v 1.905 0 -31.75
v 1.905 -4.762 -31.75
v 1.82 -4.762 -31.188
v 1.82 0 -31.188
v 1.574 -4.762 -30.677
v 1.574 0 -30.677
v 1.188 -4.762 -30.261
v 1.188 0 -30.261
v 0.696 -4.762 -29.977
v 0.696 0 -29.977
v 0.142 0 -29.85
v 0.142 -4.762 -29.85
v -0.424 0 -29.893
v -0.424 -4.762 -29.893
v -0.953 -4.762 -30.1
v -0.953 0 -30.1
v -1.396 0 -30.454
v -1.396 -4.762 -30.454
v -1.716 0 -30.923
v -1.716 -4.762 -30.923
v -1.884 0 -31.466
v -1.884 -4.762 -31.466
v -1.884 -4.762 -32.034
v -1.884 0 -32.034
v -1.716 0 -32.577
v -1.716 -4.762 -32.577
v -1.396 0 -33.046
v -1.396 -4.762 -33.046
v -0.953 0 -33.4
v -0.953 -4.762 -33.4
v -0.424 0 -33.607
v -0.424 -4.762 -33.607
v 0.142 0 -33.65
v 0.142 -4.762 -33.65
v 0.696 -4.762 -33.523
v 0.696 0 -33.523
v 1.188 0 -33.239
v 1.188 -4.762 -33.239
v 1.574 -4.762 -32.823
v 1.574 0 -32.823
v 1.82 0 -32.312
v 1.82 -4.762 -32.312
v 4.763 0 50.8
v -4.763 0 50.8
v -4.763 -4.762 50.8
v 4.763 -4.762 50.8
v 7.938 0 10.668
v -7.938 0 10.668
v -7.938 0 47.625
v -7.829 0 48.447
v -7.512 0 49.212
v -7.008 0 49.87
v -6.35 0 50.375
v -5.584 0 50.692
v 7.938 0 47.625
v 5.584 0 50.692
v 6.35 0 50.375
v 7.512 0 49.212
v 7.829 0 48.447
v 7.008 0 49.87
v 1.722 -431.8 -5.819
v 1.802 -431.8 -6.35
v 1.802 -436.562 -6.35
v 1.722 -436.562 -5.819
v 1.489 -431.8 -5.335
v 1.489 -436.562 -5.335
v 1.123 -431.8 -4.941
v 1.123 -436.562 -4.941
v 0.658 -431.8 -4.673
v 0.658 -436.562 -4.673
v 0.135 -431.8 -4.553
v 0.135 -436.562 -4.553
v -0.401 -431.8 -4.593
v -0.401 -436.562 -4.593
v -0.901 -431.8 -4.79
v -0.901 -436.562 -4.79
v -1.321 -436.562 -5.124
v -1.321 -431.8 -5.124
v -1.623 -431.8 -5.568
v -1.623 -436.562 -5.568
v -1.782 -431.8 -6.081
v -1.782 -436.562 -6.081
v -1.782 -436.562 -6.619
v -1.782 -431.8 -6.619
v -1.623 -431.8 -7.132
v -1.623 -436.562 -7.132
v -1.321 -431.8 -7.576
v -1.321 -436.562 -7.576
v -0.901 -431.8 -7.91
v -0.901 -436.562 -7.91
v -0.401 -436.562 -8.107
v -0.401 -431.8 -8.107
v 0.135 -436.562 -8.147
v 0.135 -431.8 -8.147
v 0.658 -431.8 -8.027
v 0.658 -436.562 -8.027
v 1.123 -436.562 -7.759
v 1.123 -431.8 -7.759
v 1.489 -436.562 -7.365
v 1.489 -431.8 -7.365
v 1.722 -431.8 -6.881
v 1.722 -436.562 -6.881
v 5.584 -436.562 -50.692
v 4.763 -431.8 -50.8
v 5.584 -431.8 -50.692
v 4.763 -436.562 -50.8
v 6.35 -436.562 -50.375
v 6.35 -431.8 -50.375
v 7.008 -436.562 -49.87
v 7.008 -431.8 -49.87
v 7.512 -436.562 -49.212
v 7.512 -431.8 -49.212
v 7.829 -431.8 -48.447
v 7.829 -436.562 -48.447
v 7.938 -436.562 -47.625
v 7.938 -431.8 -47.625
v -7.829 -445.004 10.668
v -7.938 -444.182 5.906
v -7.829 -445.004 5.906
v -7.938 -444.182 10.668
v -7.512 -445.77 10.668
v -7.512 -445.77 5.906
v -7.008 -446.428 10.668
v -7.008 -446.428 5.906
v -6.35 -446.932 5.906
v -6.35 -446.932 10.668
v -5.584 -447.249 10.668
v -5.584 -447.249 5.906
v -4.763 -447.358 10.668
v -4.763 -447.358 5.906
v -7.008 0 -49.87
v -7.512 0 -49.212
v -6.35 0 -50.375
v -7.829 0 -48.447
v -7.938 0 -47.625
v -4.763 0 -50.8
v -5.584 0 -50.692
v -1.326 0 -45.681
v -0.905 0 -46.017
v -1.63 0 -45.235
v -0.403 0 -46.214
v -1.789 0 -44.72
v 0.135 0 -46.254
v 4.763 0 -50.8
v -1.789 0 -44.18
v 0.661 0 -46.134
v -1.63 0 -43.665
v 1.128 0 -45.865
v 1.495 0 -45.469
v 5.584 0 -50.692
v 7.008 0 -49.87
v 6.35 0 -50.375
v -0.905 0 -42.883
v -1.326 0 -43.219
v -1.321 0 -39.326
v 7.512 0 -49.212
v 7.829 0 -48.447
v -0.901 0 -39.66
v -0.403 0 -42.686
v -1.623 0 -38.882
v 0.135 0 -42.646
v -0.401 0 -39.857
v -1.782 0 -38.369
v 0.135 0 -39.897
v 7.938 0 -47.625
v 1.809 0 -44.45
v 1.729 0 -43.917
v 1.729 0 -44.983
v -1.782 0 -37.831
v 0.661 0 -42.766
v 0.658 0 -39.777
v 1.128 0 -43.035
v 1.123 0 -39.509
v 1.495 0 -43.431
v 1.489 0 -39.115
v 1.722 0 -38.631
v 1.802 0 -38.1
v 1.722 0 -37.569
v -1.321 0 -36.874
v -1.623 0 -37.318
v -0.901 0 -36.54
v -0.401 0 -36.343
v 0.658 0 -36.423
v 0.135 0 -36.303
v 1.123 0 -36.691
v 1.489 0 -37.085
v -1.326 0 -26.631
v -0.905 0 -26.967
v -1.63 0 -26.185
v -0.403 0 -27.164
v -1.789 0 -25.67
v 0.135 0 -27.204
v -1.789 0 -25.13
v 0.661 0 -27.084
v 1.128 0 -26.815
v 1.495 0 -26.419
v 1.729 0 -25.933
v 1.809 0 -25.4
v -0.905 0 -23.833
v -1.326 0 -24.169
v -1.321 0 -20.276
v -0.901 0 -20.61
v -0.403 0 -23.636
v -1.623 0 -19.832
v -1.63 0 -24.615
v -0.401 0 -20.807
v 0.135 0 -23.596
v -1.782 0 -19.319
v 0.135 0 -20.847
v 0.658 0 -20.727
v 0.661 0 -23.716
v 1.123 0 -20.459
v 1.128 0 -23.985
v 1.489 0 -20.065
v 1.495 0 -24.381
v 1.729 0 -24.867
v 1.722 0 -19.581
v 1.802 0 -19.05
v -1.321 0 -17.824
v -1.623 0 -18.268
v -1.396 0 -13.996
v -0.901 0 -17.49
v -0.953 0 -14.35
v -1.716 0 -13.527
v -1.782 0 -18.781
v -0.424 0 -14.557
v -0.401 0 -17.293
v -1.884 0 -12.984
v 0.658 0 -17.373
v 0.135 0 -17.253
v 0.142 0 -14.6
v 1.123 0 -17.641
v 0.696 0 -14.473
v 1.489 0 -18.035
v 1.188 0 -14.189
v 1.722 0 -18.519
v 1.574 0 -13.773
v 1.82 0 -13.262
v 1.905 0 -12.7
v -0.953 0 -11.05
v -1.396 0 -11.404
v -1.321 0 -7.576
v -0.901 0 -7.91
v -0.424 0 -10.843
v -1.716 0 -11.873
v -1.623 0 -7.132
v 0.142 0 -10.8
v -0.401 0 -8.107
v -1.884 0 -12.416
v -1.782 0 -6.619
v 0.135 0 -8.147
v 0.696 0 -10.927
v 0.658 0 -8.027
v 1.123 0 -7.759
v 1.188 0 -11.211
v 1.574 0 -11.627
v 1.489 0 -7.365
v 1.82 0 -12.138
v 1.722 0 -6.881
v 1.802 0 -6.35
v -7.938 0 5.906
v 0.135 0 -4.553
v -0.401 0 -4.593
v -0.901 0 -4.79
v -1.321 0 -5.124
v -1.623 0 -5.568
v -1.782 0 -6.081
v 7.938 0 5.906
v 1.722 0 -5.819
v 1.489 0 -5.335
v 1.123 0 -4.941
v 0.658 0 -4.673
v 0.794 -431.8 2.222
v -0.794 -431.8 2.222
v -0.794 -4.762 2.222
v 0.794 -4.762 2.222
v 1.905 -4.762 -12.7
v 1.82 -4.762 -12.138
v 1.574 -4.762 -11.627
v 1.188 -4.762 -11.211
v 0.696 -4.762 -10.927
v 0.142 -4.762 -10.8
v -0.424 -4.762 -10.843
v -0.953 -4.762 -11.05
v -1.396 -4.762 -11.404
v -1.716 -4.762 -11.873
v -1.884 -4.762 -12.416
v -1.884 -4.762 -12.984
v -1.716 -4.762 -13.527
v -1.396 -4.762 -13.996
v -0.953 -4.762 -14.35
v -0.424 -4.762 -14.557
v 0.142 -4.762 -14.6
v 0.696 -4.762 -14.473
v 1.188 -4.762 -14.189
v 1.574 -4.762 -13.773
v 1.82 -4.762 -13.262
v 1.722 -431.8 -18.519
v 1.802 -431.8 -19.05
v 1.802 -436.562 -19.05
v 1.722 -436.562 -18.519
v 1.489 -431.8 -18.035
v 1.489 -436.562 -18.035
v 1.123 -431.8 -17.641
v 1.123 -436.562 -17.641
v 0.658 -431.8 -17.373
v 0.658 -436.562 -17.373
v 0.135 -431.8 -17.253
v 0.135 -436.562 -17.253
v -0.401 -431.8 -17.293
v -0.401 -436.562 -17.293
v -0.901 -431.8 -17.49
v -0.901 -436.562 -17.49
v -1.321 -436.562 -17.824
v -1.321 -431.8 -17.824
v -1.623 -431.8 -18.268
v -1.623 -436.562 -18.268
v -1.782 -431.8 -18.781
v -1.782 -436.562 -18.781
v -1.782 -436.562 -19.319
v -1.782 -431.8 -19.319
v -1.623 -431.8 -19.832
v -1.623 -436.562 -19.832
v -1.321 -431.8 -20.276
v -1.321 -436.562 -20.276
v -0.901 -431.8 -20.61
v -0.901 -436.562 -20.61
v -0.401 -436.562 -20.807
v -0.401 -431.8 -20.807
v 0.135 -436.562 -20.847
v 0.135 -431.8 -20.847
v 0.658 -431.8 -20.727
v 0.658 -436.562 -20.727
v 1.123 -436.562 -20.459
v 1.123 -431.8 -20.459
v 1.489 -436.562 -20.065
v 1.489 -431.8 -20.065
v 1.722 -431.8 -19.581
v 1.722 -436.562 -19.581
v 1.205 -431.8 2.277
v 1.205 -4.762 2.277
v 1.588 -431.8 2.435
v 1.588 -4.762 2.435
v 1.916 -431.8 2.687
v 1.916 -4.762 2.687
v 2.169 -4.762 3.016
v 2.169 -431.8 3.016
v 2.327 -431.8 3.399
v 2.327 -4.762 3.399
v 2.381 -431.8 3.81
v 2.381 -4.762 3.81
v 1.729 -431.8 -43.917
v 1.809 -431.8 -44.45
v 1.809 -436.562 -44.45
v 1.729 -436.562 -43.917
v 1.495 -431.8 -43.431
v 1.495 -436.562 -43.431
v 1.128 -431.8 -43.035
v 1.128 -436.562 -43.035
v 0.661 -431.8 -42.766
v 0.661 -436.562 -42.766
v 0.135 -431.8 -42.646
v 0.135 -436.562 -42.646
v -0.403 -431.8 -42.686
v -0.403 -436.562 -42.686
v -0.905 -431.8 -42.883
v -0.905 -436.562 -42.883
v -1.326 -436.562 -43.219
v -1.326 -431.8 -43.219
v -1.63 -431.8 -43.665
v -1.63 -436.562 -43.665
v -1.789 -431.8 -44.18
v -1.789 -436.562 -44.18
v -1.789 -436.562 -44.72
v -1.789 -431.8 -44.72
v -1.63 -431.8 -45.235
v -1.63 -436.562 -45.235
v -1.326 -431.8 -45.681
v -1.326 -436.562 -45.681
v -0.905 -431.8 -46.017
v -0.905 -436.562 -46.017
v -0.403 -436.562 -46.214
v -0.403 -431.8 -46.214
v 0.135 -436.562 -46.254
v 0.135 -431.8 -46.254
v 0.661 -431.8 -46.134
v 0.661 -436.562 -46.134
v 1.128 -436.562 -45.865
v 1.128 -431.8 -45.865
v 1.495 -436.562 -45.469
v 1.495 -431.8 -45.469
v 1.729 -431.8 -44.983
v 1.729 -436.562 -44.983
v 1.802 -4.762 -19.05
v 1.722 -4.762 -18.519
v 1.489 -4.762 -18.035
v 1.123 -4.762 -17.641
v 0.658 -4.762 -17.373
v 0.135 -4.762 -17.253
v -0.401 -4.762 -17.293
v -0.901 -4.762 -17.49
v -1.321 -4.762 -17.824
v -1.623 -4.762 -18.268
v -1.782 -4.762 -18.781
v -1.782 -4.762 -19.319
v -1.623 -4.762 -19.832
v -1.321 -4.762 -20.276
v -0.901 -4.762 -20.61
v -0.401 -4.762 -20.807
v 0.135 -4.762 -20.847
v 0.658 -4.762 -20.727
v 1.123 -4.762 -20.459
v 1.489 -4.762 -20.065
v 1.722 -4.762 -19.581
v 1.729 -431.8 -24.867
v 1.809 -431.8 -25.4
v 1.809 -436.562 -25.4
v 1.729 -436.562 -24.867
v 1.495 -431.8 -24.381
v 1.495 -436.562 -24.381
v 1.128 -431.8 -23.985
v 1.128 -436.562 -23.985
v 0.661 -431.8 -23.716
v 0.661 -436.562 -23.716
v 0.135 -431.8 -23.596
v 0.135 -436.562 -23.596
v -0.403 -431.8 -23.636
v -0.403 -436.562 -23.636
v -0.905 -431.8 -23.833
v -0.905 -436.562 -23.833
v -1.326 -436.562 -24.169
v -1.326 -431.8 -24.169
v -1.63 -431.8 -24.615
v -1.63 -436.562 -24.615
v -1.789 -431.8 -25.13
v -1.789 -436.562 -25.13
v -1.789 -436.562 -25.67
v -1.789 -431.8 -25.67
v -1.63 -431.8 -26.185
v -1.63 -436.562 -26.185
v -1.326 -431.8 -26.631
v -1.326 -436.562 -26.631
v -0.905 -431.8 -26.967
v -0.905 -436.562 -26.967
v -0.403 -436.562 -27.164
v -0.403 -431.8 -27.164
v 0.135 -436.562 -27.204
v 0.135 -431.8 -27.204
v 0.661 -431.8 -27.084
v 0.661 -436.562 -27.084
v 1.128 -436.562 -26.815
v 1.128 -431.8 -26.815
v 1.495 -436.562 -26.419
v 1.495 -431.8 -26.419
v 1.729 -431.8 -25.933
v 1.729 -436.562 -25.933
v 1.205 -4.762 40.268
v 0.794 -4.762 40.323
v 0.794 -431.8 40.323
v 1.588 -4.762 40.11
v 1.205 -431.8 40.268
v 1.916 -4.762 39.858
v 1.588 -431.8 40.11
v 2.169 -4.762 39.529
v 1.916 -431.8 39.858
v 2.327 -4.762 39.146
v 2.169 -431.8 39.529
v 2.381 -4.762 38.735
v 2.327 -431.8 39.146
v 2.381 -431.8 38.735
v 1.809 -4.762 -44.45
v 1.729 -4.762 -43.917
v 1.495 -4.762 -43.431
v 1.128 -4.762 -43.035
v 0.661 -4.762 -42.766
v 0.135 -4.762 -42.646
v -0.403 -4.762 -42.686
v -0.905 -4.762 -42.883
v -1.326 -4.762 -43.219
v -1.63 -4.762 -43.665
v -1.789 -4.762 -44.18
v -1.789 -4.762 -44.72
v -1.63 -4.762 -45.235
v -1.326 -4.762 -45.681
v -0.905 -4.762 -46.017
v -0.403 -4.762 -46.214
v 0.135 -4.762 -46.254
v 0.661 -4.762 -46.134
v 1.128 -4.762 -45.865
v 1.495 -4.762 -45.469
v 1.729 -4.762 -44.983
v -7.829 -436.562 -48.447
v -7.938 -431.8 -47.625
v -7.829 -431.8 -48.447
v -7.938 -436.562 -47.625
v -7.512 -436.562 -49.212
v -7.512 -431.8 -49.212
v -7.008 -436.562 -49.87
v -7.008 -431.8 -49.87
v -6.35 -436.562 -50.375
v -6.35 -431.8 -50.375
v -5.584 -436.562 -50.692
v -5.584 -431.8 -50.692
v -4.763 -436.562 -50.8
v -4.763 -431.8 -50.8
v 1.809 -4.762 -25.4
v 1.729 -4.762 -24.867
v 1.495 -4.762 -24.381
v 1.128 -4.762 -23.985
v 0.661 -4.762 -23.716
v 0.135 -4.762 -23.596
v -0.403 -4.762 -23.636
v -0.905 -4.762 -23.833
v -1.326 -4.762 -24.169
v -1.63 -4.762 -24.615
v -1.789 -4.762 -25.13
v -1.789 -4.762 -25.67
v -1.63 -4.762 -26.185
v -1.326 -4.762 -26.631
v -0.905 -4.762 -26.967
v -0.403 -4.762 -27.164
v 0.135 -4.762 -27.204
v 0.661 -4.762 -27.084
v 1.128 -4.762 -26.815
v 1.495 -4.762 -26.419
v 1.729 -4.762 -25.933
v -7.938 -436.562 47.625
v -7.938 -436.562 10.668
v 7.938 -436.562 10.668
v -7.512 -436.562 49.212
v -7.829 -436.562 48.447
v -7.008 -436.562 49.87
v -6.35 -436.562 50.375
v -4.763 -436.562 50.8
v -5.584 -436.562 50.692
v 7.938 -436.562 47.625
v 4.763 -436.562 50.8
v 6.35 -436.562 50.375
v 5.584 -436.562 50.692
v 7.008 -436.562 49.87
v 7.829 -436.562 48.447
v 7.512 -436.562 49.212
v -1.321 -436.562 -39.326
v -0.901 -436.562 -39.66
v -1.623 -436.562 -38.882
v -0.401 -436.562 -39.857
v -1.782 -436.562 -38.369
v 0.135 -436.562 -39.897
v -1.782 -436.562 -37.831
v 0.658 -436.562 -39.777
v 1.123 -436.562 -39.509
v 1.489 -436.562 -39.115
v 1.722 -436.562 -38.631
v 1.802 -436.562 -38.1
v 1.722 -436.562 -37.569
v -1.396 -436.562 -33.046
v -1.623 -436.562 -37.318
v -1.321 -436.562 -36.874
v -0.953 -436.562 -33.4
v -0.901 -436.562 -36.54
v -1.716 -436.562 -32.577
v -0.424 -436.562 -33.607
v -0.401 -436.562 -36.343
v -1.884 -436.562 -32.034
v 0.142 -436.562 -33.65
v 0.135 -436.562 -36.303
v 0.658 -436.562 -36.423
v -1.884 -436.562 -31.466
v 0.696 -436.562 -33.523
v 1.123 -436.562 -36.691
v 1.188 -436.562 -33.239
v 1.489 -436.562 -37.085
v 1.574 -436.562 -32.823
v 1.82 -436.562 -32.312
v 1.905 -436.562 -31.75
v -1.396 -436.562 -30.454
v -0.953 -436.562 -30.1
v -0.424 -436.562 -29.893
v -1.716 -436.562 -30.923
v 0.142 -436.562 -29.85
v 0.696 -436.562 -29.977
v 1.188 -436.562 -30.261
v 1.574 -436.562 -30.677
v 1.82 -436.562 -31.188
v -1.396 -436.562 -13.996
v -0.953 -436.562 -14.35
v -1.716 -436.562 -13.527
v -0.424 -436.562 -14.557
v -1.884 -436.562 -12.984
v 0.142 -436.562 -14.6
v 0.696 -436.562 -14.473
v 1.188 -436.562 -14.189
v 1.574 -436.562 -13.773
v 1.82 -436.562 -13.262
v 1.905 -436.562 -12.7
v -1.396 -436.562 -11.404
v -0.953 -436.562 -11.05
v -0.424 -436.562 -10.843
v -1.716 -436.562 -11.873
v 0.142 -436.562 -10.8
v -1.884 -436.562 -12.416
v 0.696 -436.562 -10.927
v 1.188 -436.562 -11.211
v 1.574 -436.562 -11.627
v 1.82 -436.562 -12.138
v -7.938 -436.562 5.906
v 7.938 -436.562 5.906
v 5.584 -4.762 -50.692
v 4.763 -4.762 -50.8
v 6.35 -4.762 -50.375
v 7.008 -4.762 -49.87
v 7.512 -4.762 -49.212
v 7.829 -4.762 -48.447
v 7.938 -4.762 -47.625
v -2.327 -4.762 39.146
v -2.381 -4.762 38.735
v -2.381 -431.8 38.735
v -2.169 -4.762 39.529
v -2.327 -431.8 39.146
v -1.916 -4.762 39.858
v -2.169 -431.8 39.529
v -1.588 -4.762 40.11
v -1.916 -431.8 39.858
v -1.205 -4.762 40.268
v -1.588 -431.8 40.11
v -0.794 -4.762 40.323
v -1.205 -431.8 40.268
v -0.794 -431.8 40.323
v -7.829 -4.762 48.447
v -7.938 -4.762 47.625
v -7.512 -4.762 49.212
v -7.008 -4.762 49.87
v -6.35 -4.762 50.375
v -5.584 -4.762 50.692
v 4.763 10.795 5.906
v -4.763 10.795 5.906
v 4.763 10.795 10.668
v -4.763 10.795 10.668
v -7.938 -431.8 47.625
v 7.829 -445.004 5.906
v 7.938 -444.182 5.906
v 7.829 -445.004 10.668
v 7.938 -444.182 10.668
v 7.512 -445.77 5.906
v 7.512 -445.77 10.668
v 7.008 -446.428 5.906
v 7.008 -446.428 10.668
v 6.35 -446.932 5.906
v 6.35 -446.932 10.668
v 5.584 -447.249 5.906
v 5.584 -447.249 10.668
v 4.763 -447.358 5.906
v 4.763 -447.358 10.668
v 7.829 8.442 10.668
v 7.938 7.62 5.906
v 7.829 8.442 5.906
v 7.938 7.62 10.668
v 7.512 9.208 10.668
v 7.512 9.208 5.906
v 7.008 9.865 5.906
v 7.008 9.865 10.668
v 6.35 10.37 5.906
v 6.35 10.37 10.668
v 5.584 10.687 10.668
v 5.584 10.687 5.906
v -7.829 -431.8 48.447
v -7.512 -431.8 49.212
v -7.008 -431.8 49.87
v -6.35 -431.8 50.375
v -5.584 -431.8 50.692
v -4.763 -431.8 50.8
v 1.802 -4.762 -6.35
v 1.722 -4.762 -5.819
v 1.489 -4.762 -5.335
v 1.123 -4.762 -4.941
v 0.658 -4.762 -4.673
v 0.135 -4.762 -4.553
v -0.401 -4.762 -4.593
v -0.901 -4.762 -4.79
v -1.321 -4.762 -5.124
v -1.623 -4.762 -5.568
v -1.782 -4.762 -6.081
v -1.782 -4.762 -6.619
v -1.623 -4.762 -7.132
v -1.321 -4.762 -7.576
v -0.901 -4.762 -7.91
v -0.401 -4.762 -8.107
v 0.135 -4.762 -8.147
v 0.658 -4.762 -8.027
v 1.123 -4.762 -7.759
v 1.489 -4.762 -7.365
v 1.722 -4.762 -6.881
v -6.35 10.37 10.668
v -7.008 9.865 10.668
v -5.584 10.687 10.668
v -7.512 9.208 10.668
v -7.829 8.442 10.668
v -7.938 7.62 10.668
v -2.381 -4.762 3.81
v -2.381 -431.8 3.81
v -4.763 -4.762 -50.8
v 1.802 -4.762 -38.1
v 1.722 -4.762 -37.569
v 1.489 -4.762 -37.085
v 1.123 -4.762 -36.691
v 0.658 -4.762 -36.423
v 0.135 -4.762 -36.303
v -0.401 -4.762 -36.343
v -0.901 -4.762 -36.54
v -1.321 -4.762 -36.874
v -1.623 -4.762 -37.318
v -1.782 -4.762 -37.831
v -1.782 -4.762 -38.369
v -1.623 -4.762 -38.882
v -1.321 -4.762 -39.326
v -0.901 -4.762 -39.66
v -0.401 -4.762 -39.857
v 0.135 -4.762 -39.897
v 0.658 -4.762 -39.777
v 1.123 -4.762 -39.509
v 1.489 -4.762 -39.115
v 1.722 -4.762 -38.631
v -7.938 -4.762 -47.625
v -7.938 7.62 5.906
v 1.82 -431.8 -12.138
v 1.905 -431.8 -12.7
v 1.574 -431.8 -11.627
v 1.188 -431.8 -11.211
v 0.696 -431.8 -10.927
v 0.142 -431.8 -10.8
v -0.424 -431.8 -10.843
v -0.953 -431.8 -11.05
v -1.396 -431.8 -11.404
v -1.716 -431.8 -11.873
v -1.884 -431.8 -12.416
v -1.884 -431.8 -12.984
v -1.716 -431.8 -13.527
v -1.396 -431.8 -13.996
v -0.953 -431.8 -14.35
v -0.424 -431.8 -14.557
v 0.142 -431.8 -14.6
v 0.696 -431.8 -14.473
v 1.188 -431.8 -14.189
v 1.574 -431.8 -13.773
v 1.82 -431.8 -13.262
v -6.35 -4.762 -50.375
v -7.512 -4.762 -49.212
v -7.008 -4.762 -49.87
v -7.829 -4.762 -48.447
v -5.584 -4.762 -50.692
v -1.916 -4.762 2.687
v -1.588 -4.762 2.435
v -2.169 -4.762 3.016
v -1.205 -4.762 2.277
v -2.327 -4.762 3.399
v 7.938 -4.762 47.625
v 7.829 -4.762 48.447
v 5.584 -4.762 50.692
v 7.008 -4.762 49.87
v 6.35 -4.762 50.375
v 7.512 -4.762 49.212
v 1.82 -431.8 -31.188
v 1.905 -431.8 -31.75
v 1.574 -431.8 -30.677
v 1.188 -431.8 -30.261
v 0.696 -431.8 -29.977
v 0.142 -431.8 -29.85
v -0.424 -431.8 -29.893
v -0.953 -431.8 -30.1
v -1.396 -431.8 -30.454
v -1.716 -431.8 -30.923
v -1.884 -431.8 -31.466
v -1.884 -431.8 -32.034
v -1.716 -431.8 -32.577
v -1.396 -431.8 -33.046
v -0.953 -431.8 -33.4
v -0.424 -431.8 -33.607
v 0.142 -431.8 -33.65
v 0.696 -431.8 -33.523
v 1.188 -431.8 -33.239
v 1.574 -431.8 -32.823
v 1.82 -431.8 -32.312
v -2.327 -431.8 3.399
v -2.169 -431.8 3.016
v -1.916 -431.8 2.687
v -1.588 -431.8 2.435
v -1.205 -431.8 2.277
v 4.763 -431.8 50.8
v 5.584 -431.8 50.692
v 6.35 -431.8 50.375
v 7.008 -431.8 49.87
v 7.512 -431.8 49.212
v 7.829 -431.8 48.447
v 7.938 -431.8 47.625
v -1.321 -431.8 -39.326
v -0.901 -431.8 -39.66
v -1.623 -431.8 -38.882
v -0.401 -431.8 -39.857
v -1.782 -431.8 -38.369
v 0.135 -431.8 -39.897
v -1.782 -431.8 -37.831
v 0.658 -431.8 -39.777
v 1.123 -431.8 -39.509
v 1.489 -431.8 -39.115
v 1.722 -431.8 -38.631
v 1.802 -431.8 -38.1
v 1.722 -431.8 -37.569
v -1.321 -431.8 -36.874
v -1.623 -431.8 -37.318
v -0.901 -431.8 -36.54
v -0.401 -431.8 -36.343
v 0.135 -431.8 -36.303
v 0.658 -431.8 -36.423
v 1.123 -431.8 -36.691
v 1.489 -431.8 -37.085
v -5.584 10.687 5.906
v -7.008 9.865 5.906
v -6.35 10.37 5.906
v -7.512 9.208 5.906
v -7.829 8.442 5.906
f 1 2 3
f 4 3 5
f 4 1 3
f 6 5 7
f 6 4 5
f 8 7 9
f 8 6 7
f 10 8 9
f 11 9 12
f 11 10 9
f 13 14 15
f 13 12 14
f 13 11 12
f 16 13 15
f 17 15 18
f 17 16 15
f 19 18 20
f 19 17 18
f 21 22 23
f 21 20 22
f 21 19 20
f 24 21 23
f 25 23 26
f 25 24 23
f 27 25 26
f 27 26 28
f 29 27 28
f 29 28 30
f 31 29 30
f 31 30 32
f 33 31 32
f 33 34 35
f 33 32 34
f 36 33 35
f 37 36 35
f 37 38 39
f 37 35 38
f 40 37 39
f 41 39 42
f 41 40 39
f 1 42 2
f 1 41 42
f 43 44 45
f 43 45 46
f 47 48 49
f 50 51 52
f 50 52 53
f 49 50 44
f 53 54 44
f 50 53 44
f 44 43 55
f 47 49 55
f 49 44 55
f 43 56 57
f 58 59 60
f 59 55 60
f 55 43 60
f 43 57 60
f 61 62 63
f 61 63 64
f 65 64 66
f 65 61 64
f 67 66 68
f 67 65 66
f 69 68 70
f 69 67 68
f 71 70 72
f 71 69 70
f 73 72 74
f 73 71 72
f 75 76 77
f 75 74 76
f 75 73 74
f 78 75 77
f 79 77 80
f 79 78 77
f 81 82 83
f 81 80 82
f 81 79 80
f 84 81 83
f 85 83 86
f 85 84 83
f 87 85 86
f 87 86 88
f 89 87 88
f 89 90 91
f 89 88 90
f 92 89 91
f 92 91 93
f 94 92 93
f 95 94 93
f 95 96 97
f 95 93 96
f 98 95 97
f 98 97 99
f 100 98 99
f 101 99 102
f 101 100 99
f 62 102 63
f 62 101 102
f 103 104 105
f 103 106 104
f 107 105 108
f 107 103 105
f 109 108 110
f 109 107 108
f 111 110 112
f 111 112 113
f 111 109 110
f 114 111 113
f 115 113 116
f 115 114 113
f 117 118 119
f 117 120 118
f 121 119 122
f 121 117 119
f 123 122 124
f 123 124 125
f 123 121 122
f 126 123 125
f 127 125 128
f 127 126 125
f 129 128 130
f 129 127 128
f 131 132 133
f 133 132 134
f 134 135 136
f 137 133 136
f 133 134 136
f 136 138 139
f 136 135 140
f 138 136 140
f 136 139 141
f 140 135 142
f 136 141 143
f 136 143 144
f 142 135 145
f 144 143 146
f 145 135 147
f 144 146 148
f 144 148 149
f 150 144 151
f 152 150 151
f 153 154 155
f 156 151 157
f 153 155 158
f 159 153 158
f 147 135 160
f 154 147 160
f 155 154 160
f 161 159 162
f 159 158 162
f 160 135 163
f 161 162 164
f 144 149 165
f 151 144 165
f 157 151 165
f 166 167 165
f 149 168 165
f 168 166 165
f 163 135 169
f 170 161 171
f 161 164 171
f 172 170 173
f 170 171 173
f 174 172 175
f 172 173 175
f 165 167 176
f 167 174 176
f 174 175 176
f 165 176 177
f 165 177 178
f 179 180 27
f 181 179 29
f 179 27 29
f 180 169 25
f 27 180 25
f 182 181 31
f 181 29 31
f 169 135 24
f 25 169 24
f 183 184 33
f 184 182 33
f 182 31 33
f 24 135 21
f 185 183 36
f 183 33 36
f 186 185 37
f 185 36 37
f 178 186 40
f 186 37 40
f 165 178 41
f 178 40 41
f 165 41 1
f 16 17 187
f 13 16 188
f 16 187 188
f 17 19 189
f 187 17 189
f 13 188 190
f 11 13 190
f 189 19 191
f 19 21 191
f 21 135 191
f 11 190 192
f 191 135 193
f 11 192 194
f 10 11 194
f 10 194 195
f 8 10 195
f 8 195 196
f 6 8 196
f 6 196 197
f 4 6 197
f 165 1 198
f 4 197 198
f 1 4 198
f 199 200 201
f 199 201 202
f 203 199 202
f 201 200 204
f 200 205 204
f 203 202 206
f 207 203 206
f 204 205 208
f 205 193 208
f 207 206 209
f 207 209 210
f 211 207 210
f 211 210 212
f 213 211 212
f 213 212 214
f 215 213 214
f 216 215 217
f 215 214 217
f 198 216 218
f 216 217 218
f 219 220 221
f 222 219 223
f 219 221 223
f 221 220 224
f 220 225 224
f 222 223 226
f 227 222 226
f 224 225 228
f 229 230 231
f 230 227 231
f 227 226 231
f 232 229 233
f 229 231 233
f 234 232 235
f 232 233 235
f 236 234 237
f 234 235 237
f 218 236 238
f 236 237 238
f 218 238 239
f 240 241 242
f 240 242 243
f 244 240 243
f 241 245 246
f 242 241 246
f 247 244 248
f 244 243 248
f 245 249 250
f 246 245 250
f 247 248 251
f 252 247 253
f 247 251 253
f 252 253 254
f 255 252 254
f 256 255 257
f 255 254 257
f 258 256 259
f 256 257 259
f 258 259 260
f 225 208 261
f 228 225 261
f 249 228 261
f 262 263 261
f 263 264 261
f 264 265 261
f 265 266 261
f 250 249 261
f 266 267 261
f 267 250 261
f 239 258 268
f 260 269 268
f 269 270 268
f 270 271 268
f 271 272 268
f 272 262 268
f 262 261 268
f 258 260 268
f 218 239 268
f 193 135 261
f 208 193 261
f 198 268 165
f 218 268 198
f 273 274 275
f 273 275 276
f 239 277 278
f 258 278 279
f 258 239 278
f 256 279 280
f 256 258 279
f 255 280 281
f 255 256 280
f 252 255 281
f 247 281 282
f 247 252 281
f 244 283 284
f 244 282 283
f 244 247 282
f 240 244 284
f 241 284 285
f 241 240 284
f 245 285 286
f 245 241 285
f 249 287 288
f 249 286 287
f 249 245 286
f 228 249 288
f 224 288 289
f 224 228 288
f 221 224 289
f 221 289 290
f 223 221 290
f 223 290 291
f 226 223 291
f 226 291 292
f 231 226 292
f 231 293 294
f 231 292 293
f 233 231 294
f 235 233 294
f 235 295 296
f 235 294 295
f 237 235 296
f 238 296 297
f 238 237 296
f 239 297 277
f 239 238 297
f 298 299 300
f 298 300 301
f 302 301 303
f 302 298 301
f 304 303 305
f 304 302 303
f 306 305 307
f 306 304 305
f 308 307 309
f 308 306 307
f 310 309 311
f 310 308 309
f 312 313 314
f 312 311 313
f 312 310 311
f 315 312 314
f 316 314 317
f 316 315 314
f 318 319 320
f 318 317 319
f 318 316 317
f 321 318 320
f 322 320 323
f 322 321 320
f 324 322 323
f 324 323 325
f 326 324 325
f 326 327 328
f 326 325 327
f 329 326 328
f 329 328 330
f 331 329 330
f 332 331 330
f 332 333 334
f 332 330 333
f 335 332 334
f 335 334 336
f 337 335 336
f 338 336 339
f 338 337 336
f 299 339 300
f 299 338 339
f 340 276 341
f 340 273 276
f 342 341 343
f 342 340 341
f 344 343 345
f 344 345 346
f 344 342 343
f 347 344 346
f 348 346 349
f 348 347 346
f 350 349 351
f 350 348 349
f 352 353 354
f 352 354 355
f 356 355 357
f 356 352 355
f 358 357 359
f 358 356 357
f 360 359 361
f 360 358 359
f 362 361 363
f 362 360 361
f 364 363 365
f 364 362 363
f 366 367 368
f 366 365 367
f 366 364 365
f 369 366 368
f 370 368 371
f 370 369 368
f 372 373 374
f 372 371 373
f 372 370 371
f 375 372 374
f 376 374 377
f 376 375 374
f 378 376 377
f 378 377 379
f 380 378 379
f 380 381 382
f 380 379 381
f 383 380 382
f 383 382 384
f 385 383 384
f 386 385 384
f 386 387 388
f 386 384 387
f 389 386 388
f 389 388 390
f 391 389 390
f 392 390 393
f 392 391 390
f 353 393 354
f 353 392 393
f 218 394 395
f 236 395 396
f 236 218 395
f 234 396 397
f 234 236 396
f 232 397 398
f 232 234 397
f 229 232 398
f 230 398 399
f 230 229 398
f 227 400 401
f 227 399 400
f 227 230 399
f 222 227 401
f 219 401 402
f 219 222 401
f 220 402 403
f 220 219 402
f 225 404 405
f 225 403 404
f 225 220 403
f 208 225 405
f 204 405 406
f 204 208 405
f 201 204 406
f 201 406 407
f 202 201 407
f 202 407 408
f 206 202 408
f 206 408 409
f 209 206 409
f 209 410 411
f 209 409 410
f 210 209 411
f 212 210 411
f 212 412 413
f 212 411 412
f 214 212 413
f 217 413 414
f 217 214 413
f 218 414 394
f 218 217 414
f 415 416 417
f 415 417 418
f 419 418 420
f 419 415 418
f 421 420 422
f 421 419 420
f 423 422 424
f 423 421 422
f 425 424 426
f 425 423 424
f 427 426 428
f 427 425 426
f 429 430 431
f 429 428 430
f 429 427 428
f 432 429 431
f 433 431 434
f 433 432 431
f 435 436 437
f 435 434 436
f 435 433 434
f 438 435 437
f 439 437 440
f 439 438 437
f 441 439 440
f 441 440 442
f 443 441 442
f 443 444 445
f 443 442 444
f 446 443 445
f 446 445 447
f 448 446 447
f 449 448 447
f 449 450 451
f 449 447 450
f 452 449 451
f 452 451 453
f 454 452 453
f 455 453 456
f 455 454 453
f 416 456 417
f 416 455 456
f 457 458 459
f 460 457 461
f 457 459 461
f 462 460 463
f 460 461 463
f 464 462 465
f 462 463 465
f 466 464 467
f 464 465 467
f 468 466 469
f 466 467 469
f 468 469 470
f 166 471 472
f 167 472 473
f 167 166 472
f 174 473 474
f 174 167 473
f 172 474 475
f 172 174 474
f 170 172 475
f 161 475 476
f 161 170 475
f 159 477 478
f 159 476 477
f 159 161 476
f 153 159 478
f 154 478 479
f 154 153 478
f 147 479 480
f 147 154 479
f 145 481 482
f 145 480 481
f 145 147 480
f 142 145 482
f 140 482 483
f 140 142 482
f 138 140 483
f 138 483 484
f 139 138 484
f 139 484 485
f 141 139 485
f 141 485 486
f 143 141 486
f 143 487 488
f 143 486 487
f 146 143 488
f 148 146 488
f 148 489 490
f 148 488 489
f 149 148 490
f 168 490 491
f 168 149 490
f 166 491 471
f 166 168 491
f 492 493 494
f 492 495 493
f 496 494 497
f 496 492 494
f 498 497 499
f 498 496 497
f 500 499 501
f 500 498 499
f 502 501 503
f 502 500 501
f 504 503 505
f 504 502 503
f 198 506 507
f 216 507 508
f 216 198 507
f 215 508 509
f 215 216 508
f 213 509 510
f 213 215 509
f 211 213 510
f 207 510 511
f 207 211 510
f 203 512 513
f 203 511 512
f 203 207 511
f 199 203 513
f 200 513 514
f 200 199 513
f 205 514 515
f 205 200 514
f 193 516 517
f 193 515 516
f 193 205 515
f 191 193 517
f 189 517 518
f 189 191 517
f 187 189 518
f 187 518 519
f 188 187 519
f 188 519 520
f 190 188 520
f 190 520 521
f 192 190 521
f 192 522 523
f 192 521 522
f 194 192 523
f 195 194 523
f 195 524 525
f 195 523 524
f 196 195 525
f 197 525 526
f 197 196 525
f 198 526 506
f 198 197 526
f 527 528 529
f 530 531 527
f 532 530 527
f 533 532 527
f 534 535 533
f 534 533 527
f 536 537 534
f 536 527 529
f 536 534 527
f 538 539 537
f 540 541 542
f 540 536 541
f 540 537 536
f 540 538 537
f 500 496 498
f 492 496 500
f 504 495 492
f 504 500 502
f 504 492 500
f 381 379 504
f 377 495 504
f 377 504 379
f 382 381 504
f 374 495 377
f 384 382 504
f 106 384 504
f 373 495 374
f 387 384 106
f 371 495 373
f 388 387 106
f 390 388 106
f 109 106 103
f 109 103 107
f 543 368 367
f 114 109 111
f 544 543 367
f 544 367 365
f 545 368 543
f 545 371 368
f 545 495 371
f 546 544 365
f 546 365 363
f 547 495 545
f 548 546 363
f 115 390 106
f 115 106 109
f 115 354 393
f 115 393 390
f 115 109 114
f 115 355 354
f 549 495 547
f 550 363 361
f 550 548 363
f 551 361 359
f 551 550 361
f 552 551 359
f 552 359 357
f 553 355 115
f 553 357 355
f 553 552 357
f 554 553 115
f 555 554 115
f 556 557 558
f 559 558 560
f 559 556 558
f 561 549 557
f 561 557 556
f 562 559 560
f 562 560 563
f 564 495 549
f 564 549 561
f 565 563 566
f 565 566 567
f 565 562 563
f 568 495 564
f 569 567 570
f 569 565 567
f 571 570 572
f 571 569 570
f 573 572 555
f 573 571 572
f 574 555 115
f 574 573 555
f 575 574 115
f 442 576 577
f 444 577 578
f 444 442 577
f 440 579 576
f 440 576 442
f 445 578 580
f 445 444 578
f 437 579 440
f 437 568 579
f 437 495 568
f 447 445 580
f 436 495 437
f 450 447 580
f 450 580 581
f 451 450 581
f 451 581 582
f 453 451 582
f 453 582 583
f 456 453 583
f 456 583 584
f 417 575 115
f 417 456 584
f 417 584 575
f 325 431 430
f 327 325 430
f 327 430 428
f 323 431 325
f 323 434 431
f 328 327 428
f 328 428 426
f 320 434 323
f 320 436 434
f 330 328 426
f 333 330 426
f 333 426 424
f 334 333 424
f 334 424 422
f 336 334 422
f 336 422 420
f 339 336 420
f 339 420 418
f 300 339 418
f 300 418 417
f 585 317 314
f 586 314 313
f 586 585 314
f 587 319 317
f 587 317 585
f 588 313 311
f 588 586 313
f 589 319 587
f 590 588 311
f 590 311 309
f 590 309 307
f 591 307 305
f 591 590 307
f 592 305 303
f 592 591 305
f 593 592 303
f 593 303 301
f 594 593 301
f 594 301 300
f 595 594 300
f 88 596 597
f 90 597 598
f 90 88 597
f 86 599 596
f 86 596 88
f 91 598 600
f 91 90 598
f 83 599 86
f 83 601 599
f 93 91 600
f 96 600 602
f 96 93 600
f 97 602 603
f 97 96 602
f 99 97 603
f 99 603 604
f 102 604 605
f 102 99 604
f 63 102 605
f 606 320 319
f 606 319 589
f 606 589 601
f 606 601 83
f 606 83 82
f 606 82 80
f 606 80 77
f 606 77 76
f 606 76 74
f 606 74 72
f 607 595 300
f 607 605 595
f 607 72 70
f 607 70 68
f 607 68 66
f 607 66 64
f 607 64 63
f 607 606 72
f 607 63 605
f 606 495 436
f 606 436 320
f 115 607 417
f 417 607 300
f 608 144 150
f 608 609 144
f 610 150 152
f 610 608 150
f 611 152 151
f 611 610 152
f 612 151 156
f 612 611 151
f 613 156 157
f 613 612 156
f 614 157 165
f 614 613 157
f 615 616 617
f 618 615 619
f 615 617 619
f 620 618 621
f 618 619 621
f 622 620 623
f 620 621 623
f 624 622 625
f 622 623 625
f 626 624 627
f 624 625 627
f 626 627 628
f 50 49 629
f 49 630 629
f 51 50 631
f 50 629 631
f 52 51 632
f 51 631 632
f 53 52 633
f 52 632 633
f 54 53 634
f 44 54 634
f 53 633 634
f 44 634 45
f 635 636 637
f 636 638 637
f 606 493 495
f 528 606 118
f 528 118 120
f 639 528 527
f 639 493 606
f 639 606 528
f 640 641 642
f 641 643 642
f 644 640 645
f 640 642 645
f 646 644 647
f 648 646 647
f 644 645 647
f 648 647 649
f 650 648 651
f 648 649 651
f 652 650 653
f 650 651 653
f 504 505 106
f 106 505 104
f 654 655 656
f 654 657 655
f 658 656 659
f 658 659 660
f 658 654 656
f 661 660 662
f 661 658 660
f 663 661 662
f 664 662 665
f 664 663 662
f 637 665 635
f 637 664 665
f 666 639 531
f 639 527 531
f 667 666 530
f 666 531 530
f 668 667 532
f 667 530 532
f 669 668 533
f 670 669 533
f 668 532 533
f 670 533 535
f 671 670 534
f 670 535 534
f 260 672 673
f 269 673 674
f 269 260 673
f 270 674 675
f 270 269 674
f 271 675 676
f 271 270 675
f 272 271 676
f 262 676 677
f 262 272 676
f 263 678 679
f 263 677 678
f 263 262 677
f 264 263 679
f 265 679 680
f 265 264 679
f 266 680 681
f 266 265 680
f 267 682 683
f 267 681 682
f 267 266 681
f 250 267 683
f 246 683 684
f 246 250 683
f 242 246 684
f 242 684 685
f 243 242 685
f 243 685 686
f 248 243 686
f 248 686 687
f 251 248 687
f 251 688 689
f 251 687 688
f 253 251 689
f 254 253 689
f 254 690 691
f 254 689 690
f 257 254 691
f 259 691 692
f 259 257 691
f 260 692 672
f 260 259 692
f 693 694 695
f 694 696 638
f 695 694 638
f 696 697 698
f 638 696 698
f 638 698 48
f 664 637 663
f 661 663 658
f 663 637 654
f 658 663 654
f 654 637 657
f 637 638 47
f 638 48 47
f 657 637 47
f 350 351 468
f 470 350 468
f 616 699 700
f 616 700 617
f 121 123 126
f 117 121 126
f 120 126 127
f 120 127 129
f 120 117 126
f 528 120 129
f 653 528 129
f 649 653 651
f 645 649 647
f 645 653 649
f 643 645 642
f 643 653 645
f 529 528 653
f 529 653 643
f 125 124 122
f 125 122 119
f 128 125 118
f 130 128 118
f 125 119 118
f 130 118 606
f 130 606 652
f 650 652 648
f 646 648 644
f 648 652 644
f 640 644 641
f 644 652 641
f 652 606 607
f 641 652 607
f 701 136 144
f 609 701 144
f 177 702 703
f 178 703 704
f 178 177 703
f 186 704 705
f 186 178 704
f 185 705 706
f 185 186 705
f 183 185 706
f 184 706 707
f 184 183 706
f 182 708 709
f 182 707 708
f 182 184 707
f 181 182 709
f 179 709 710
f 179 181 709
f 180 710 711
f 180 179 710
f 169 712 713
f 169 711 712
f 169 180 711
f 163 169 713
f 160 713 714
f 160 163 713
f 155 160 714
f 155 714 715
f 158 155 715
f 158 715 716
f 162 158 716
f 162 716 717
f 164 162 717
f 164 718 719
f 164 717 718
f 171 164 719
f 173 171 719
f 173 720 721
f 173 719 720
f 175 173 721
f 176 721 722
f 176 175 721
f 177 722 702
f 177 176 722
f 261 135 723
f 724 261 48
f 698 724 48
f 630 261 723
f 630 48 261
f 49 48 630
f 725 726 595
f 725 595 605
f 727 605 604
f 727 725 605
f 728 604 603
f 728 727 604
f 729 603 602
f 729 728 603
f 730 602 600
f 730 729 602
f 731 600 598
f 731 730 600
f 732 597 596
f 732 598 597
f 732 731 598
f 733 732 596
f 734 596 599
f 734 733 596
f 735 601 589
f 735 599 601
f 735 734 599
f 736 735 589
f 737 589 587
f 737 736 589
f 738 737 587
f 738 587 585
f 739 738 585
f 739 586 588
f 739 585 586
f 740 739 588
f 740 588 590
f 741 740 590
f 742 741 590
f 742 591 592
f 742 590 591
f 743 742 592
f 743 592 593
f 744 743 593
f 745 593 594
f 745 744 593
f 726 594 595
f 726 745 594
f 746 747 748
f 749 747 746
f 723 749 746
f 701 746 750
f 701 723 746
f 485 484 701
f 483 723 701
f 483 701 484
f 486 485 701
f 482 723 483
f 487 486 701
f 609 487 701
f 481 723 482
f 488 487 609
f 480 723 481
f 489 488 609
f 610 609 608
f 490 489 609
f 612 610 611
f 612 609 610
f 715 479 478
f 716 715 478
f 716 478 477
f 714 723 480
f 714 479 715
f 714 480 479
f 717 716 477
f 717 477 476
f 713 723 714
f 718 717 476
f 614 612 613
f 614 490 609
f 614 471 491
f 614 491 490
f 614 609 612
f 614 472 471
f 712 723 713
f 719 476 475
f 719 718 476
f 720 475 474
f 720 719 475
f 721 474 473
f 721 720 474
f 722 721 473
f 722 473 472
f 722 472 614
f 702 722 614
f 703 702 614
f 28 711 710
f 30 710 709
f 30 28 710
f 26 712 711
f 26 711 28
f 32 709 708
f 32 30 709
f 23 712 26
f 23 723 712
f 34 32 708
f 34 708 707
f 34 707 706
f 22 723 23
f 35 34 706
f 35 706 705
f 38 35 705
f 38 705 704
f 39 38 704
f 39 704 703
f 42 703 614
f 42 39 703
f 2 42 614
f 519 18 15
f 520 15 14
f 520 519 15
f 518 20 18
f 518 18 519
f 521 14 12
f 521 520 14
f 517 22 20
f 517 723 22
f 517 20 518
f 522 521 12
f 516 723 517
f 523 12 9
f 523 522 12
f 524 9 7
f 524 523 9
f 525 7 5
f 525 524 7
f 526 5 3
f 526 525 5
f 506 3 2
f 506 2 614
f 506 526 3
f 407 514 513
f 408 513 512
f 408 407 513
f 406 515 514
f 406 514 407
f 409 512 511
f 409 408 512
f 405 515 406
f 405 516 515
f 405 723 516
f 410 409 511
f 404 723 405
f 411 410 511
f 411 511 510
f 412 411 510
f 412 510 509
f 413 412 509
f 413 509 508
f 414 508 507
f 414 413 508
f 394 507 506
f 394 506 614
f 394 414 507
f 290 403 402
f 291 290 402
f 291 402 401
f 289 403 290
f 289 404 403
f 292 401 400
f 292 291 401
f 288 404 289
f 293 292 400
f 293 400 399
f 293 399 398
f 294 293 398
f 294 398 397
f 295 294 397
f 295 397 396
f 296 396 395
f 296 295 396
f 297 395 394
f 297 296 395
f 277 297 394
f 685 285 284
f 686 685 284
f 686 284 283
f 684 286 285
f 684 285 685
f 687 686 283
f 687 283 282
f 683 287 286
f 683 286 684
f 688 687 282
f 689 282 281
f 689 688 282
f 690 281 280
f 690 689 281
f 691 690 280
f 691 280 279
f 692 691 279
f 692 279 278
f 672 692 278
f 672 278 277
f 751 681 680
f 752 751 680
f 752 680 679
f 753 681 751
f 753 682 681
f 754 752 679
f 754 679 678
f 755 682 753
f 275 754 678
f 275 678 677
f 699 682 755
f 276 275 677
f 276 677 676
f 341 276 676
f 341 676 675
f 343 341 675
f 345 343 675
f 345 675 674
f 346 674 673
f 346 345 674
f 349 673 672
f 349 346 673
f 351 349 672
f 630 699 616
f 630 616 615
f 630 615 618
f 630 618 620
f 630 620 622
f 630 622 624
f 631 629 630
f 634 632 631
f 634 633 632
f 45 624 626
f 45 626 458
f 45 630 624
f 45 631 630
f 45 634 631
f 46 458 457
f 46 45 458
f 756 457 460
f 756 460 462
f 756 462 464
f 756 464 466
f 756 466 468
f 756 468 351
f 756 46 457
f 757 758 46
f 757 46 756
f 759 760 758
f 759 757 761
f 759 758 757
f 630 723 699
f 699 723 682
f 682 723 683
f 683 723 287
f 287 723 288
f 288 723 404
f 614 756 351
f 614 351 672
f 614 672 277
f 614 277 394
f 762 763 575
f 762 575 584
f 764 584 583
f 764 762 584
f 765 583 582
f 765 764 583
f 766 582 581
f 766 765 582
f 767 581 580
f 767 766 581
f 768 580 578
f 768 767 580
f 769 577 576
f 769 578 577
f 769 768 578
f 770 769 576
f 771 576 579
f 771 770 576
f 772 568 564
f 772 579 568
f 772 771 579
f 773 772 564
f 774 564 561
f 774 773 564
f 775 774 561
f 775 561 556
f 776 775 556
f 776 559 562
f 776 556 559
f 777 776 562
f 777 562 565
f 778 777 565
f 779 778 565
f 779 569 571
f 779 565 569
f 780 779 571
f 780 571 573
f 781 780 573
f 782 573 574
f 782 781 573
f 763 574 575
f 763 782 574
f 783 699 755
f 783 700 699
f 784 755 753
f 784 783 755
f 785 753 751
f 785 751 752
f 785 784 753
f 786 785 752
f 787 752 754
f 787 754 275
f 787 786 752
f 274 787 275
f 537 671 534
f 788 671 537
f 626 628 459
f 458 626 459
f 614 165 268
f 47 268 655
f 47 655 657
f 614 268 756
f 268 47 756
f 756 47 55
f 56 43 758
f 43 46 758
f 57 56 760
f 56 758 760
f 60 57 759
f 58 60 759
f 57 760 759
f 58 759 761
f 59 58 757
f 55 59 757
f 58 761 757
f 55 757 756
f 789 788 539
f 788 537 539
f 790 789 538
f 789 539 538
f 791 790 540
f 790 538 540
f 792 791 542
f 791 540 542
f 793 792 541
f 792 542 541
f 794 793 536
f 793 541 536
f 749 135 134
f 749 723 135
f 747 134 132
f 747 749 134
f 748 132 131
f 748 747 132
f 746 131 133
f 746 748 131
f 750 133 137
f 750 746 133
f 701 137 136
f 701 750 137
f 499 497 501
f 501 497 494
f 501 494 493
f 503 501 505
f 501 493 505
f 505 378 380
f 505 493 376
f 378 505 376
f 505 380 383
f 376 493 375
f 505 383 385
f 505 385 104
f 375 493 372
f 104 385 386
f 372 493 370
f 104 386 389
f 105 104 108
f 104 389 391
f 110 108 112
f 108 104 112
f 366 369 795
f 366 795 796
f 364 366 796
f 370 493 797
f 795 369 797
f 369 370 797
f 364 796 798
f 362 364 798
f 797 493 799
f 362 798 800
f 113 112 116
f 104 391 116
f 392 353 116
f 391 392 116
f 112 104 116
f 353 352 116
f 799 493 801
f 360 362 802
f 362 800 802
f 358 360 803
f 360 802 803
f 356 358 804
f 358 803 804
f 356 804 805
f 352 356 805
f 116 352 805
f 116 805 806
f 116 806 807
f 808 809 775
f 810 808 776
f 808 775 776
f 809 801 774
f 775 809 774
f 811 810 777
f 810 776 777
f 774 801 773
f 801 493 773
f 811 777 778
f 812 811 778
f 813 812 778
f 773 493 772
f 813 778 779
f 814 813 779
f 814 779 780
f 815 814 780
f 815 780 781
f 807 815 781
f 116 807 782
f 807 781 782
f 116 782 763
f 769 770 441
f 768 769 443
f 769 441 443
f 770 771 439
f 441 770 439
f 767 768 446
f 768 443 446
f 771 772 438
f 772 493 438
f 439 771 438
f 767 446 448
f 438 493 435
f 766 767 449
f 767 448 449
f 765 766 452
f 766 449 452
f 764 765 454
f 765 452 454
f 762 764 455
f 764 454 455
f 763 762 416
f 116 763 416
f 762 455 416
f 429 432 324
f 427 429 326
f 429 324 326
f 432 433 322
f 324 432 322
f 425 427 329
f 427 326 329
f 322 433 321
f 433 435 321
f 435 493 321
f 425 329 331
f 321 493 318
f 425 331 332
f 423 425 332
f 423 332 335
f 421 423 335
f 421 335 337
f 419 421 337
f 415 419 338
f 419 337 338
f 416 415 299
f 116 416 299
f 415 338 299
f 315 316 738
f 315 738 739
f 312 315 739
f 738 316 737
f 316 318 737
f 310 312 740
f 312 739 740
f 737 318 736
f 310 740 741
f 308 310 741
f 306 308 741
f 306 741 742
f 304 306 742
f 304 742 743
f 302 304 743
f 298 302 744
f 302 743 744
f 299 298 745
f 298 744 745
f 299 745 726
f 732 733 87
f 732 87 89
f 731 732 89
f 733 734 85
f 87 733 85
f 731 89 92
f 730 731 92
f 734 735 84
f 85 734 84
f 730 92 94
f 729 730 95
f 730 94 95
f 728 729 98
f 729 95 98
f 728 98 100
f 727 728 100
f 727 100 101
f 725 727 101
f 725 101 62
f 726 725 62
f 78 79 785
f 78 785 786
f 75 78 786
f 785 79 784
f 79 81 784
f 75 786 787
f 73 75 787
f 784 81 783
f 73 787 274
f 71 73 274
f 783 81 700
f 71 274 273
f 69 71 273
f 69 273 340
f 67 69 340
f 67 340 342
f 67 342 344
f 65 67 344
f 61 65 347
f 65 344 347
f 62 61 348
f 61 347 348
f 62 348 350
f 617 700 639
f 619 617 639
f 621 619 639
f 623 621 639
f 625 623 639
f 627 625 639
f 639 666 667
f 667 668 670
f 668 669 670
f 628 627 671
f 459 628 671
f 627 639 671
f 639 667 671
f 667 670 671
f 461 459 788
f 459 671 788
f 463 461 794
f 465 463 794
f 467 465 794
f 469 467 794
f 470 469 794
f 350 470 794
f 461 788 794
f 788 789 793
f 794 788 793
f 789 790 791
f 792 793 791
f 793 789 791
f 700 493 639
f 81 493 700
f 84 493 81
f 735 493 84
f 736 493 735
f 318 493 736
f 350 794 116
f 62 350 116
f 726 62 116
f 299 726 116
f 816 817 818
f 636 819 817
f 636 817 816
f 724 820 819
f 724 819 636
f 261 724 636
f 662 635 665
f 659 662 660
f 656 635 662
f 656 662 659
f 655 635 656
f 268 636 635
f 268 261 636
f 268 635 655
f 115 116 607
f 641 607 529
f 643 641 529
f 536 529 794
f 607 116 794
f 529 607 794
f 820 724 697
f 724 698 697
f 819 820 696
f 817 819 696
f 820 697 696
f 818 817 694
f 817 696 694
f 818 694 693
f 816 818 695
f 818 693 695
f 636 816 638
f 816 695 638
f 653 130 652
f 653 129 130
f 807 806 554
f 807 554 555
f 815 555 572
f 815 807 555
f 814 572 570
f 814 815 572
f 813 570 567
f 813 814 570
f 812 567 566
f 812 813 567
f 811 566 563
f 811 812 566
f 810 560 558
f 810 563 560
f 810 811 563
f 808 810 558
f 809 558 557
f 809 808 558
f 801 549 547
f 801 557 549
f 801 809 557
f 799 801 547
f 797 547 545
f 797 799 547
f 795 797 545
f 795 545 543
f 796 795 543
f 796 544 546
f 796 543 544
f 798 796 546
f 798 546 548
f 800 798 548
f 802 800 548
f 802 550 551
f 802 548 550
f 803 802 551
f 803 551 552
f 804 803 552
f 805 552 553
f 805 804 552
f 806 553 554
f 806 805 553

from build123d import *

# Parameters (mm, degrees)
F0_W     = 15.875
F0_H     = 101.6
F4_DEPTH = 4.7625
F2_W     = 15.875
F2_H     = 4.7625
F5_DEPTH = 10.795
F1_W     = 4.7625
F1_H     = 38.1
F6_DEPTH = 431.8
F7_START = 431.8
F7_DEPTH = 4.7625
F8_START = 436.5625
F8_DEPTH = 10.795
F3_R     = 1.905
F3_R_2   = 1.8018515142
F3_R_3   = 1.8092820601
F9_DEPTH = 447.3585
F11_R    = 1.5875
F12_R    = 3.175


with BuildPart() as f4:
    # F0 (on Front) → F4 (new body)
    with BuildSketch(Plane.XZ):
        Rectangle(F0_W, F0_H)
    extrude(amount=F4_DEPTH)

    # F2 (on Front) → F5 (join)
    with BuildSketch(Plane.XZ):
        with Locations((0, 8.28675)):
            Rectangle(F2_W, F2_H)
    extrude(amount=-F5_DEPTH)

    # F1 (on Front) → F6 (join)
    with BuildSketch(Plane.XZ):
        with Locations((0, 21.2725)):
            Rectangle(F1_W, F1_H)
    extrude(amount=F6_DEPTH)

    # F0 (on Front) → F7 (join)
    with BuildSketch(Plane.XZ.offset(F7_START)):
        Rectangle(F0_W, F0_H)
    extrude(amount=F7_DEPTH)

    # F2 (on Front) → F8 (join)
    with BuildSketch(Plane.XZ.offset(F8_START)):
        with Locations((0, 8.28675)):
            Rectangle(F2_W, F2_H)
    extrude(amount=F8_DEPTH)

    # F3 (on Front) → F9 (cut, through all)
    with BuildSketch(Plane.XZ):
        with Locations((0, -31.75)):
            Circle(F3_R)
        with Locations((0, -38.1)):
            Circle(F3_R_2)
        with Locations((0, -44.45)):
            Circle(F3_R_3)
        with Locations((0, -12.7)):
            Circle(F3_R)
        with Locations((0, -19.05)):
            Circle(F3_R_2)
        with Locations((0, -25.4)):
            Circle(F3_R_3)
        with Locations((0, -6.35)):
            Circle(F3_R_2)
    extrude(amount=F9_DEPTH, mode=Mode.SUBTRACT)

    # F11
    f11_edges = [f4.edges().sort_by_distance(p)[0] for p in [
        (-2.38125, -218.28125, 40.3225),
        (2.38125, -218.28125, 40.3225),
        (2.38125, -218.28125, 2.2225),
        (-2.38125, -218.28125, 2.2225),
    ]]
    fillet(f11_edges, radius=F11_R)

    # F12
    f12_edges = [f4.edges().sort_by_distance(p)[0] for p in [
        (7.9375, -434.18125, 50.8),
        (-7.9375, -434.18125, 50.8),
        (7.9375, -434.18125, -50.8),
        (-7.9375, -434.18125, -50.8),
        (-7.9375, -447.3575, 8.28675),
        (7.9375, -447.3575, 8.28675),
        (7.9375, -2.38125, 50.8),
        (-7.9375, -2.38125, 50.8),
        (7.9375, -2.38125, -50.8),
        (-7.9375, -2.38125, -50.8),
        (-7.9375, 10.795, 8.28675),
        (7.9375, 10.795, 8.28675),
    ]]
    fillet(f12_edges, radius=F12_R)


solid = f4.part
